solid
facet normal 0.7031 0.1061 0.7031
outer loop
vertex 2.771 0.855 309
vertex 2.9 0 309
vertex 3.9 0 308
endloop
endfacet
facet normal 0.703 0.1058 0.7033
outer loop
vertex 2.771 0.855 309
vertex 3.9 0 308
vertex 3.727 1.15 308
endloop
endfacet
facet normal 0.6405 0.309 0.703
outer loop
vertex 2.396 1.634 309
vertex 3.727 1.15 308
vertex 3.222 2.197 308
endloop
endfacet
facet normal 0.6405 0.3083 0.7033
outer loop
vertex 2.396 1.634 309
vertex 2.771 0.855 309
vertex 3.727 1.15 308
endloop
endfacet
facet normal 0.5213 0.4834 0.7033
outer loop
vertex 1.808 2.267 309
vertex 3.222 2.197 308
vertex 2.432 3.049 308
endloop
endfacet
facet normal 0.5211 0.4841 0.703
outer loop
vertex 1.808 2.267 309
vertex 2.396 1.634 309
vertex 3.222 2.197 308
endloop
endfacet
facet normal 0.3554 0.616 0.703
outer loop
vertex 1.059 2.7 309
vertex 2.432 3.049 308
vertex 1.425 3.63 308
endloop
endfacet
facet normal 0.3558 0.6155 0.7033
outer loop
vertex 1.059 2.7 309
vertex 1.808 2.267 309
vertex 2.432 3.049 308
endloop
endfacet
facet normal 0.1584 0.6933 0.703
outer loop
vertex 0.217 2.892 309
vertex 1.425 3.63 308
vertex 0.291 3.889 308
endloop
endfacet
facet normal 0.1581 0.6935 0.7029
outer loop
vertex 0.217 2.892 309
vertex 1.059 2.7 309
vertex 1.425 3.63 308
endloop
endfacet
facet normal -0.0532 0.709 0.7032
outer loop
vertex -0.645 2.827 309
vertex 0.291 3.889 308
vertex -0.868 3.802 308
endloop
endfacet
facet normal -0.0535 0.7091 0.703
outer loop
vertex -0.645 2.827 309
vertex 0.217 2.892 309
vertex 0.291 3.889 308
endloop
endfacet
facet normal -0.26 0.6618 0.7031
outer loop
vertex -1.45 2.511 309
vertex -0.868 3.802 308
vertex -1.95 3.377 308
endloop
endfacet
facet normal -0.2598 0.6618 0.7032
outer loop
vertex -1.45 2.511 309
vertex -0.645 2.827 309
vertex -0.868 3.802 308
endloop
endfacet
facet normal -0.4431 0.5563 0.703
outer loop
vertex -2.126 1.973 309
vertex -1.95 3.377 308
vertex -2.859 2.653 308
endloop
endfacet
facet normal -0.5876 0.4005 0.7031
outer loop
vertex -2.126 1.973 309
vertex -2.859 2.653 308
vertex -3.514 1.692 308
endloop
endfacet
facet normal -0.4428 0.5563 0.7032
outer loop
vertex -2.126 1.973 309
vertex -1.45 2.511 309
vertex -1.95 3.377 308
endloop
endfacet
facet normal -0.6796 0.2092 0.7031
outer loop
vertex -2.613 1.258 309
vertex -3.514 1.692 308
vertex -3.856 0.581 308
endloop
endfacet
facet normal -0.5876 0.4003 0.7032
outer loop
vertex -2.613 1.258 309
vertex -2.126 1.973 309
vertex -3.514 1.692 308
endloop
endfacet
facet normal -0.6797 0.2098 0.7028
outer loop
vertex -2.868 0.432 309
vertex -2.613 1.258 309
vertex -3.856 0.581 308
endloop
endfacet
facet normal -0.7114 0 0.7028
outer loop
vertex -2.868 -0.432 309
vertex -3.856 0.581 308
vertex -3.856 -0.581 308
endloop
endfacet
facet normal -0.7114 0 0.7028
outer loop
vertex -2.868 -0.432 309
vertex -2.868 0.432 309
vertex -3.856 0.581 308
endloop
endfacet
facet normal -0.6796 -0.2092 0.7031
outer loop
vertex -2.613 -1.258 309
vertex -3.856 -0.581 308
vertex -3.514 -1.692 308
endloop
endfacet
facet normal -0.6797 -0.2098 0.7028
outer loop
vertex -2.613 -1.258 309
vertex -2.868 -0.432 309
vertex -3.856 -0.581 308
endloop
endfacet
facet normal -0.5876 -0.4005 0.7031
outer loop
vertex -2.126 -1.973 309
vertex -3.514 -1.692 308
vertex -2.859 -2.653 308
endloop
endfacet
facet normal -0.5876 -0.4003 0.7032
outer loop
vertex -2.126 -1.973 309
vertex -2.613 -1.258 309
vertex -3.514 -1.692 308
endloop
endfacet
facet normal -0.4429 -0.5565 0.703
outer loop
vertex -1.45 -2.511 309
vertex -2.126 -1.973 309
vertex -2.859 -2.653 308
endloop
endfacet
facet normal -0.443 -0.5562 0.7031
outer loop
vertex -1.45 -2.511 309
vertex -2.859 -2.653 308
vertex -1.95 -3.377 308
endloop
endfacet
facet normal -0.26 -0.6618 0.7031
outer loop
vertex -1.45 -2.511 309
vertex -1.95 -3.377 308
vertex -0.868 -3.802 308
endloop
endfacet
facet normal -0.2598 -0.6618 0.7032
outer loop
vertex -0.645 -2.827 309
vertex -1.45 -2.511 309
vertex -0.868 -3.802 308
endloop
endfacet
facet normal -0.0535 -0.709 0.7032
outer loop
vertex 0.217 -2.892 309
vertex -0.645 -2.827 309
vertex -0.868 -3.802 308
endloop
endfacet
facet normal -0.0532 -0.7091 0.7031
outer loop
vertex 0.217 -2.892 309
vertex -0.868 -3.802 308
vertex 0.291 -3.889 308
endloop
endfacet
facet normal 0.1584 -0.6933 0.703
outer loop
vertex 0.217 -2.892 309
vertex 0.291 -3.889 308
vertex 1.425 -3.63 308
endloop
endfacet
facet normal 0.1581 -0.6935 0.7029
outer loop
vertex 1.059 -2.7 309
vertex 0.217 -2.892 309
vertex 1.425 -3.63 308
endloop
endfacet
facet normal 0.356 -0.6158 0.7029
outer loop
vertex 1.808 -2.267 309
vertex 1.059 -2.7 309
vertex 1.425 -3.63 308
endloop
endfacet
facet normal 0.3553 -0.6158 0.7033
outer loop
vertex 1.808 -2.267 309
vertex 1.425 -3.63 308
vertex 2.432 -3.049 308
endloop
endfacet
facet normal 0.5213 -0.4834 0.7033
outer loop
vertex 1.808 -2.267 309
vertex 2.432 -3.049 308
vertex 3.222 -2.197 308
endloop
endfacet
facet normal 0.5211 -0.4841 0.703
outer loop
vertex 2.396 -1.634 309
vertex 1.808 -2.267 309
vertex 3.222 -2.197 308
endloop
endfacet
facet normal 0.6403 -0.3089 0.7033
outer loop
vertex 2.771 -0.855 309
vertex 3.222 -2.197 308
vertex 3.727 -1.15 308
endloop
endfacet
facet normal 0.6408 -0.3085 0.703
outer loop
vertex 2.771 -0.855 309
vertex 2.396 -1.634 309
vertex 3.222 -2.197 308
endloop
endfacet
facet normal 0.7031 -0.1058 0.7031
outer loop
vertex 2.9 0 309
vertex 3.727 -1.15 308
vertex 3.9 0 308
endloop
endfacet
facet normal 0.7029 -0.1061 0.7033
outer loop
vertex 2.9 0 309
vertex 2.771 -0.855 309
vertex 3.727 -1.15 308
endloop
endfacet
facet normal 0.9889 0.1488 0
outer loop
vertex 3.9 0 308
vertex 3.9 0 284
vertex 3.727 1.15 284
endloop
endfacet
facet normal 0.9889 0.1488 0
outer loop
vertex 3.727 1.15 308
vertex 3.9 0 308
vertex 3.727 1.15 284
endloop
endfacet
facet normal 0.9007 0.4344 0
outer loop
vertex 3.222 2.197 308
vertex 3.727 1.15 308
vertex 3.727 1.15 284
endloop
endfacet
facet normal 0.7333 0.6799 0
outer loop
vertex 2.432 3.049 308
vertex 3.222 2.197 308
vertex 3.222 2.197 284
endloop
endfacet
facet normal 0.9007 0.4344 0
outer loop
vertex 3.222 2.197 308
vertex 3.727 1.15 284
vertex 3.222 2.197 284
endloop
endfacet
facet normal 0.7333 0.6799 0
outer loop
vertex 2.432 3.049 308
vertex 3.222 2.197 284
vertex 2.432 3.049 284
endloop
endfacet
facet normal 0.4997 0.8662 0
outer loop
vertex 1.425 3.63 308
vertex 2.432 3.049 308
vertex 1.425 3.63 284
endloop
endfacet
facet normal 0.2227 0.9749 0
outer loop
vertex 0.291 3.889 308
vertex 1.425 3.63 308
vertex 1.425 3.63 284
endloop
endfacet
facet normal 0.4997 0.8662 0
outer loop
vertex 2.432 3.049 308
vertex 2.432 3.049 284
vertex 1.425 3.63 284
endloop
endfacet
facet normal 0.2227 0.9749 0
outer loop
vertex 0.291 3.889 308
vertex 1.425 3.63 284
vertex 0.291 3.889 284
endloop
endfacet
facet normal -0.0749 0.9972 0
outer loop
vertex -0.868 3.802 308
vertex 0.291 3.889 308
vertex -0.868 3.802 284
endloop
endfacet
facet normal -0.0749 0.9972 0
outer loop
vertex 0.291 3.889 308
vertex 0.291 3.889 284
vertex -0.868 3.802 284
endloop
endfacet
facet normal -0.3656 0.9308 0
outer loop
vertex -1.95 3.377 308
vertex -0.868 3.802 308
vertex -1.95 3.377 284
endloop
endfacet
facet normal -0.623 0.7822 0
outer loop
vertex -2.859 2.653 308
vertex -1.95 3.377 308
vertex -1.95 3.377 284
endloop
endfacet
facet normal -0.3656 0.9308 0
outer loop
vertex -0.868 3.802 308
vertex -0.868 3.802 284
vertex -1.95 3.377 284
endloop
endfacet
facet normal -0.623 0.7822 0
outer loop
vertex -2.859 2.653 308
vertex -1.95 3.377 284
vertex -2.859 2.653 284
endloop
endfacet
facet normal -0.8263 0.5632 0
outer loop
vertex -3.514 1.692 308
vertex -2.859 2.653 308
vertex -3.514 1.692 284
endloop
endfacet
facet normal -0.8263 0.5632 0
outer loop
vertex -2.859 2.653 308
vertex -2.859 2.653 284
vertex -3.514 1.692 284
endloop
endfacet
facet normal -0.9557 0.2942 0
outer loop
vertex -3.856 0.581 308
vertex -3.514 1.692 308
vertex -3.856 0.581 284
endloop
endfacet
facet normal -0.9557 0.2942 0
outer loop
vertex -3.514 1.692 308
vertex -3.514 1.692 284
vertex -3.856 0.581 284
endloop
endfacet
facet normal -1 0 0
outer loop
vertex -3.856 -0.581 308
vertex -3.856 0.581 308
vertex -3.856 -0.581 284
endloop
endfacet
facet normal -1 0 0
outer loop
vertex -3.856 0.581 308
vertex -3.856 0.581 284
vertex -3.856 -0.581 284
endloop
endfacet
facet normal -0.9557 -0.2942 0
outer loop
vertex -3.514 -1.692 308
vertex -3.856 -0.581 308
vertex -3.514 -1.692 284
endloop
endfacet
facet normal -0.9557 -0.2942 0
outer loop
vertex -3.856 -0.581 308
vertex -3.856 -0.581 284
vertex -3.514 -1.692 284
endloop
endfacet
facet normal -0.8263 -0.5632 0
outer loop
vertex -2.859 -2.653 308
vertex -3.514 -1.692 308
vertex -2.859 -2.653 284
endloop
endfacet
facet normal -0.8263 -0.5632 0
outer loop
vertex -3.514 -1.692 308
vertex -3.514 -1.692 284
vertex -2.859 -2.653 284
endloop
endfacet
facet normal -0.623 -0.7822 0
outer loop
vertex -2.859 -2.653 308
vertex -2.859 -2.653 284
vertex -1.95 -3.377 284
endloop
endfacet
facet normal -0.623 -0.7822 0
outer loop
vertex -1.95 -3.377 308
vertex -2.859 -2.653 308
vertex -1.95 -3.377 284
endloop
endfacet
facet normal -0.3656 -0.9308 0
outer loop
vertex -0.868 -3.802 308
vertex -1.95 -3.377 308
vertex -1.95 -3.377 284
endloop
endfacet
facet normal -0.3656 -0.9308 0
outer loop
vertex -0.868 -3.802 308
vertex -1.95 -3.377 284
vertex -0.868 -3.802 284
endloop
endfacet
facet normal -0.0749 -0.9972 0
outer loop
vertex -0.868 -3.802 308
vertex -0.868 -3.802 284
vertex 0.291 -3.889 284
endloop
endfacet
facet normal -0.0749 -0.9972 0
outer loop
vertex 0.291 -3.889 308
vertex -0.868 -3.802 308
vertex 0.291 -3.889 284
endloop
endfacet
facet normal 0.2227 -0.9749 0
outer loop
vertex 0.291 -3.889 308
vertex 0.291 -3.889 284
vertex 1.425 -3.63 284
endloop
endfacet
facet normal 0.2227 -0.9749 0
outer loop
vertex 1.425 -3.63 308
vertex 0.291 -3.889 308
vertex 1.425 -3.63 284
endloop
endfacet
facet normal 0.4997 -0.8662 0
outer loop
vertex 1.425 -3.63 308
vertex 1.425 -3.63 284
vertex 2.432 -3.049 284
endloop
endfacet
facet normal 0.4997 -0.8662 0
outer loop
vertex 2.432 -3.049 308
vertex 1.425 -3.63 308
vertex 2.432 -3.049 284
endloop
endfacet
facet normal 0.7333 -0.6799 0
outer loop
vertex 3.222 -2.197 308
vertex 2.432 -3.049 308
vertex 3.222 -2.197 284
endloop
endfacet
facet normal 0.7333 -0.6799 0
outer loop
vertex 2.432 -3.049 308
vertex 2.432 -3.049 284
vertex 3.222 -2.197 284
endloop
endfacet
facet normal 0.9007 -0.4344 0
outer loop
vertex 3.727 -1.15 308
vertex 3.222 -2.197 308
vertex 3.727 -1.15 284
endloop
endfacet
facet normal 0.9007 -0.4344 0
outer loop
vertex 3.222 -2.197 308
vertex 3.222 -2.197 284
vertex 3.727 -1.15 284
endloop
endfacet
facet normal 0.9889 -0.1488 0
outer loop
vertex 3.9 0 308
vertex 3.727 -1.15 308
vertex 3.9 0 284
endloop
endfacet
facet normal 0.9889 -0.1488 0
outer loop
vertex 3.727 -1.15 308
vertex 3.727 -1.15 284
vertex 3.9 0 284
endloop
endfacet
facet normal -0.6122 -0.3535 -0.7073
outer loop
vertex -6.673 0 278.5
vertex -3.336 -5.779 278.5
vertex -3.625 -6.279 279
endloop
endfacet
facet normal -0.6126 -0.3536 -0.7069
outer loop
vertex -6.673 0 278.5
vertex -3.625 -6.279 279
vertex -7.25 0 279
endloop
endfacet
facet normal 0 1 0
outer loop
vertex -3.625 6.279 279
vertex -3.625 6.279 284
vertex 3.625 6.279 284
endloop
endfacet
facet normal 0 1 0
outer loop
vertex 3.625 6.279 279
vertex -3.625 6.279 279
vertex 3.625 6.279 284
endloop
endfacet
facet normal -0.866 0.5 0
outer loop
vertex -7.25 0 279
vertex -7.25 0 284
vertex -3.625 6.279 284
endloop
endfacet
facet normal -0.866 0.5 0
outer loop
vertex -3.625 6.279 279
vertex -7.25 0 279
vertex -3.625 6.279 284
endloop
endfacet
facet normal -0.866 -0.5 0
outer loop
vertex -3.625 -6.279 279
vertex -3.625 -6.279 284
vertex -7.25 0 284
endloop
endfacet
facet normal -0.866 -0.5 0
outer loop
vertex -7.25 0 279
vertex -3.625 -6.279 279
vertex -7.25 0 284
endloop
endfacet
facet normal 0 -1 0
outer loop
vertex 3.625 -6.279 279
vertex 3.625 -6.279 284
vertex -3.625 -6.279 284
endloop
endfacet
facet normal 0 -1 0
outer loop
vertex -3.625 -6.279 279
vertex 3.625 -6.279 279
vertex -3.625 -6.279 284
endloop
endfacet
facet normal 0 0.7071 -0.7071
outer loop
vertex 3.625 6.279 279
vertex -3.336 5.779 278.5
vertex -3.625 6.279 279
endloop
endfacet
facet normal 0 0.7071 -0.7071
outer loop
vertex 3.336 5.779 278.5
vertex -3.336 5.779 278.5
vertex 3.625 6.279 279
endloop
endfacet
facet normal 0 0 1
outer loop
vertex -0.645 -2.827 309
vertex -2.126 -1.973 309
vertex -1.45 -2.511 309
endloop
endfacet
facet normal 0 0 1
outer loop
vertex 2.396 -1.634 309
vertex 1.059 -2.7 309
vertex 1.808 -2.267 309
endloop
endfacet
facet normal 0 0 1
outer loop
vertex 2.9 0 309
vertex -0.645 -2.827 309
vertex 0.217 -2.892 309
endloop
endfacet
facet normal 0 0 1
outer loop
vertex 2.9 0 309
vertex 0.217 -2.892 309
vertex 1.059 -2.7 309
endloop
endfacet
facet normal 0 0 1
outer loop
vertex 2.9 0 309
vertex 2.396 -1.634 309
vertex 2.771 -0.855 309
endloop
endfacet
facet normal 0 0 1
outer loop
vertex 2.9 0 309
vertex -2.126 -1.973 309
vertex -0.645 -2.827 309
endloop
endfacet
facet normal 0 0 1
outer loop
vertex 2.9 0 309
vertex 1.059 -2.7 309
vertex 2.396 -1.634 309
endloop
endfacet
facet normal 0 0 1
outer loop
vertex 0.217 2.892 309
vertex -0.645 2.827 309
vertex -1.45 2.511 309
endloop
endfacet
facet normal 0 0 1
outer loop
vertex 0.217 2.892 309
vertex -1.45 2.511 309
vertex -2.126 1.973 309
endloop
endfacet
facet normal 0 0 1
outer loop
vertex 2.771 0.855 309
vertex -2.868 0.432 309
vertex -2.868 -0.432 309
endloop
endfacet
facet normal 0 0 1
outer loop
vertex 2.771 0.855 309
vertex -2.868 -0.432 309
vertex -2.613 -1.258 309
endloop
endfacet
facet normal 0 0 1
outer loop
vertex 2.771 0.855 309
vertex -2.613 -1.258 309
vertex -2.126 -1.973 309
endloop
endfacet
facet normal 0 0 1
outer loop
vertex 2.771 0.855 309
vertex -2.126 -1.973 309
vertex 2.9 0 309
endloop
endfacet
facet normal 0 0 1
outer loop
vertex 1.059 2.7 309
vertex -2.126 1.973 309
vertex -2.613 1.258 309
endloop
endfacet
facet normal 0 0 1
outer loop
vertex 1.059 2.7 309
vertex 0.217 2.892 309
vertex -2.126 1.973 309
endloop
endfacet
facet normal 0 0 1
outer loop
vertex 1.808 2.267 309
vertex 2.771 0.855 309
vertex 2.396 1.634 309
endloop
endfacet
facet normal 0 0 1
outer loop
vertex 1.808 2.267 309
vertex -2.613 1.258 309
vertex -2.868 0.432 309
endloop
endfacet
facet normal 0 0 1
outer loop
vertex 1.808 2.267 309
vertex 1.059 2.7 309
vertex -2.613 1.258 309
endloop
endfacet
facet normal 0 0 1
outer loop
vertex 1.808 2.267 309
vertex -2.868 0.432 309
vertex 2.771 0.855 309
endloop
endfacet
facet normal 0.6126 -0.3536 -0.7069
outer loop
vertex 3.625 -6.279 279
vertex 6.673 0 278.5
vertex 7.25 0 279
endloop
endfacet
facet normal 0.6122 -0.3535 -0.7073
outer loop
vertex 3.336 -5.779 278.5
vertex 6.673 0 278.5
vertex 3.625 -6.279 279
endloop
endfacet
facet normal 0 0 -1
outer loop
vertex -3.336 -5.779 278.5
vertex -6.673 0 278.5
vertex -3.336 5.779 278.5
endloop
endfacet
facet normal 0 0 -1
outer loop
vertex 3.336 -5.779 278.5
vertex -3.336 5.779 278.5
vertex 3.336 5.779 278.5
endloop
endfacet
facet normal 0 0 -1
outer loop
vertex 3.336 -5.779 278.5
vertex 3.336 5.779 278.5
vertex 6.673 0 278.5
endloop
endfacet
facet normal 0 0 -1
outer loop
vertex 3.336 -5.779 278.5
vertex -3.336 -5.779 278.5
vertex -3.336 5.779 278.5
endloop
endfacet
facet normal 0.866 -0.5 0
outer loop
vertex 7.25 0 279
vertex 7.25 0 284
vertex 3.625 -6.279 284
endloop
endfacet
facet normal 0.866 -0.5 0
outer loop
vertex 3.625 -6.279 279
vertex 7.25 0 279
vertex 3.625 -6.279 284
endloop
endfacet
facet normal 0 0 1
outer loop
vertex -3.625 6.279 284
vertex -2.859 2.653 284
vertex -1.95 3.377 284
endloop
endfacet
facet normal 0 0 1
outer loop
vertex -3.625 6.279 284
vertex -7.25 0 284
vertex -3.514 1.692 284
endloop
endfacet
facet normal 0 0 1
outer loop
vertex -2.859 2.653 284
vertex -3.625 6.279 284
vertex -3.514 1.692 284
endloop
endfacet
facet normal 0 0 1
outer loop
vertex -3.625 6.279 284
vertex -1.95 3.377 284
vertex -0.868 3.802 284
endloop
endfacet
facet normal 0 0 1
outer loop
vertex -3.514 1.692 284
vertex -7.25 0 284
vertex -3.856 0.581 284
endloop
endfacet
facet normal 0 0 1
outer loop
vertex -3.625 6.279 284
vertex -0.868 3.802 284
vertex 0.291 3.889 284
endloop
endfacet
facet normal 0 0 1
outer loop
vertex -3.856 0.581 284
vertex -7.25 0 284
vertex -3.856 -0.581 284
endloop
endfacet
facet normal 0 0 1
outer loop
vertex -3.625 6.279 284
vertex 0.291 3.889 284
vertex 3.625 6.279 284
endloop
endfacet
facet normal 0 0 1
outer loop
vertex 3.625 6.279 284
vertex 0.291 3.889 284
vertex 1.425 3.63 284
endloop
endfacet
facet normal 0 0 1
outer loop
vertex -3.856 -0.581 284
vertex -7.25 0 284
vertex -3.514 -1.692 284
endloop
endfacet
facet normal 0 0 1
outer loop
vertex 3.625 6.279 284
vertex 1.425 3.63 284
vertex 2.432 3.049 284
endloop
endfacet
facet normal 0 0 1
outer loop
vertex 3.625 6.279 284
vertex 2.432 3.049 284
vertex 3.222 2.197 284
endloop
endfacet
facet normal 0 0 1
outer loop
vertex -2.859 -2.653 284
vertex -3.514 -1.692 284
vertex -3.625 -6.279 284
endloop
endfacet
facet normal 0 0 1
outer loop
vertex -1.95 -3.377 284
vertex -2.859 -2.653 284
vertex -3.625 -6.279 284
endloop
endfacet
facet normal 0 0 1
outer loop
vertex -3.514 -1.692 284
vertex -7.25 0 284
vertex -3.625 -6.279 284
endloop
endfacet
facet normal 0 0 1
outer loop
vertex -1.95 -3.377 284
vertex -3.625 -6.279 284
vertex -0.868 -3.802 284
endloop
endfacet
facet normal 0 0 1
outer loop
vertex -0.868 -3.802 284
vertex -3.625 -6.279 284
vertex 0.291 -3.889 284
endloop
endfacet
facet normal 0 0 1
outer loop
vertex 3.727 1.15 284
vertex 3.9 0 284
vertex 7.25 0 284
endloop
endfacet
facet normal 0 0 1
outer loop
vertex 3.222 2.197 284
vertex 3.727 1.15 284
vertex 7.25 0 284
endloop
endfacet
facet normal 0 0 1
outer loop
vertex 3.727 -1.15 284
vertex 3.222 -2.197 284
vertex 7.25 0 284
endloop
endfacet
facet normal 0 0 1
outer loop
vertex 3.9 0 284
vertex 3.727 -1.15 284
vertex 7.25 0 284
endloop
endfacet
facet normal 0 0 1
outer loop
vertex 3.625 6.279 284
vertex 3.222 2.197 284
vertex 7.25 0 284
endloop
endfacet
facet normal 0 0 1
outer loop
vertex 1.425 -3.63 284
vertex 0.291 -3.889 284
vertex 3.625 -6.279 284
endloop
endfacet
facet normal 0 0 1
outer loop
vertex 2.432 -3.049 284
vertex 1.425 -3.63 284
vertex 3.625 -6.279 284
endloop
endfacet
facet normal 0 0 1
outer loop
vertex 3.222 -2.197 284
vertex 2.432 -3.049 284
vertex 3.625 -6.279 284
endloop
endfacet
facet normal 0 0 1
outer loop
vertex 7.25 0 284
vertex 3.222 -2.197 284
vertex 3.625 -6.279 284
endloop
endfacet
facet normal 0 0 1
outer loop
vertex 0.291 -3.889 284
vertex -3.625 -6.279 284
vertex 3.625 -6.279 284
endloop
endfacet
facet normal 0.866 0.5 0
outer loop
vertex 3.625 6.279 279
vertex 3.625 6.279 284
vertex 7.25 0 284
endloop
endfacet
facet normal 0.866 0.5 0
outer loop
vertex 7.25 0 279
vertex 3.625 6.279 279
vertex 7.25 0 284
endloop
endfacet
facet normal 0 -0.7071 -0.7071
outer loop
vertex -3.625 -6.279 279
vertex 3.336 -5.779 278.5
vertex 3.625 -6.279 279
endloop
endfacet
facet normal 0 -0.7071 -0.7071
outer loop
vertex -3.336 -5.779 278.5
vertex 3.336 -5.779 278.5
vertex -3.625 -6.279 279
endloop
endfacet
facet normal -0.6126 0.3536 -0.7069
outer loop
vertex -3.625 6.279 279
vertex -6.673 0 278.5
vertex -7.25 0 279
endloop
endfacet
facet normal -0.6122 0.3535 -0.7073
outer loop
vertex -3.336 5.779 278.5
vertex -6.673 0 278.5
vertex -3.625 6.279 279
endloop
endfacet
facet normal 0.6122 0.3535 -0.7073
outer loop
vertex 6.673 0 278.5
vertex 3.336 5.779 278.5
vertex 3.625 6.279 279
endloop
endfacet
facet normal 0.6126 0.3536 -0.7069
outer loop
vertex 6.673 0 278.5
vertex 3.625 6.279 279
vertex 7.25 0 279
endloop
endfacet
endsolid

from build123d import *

# Parameters (mm, degrees)
PAD029_DEPTH            = 5.5
SKETCH060_R             = 3.9
PAD030_DEPTH            = 25
CHAMFER011_SIZE         = 1
CHAMFER012_SIZE         = 0.5
BODY020_PLACEMENT_ANGLE = 180


with BuildPart() as part:
    # Sketch059 → Pad029 (new body)
    with BuildSketch(Plane.XY):
        Polygon((7.25, 0), (3.625, 6.278684), (-3.625, 6.278684), (-7.25, 0), (-3.625, -6.278684), (3.625, -6.278684), align=None)
    extrude(amount=PAD029_DEPTH)

    # Sketch060 (on Face7 of Pad029) → Pad030 (join)
    with BuildSketch(Plane(origin=(0, 0, 0), x_dir=(1, 0, 0), z_dir=(0, 0, -1))):
        Circle(SKETCH060_R)
    extrude(amount=PAD030_DEPTH)

    # Chamfer011
    chamfer011_edges = [part.edges().sort_by_distance(p)[0] for p in [
        (-3.9, 0, -25),
    ]]
    chamfer(chamfer011_edges, length=CHAMFER011_SIZE)

    # Chamfer012
    chamfer012_edges = [part.edges().sort_by_distance(p)[0] for p in [
        (5.4375, 3.139342, 5.5),
        (0, 6.278684, 5.5),
        (-5.4375, 3.139342, 5.5),
        (-5.4375, -3.139342, 5.5),
        (0, -6.278684, 5.5),
        (5.4375, -3.139342, 5.5),
    ]]
    chamfer(chamfer012_edges, length=CHAMFER012_SIZE)


with BuildPart() as part_1:
    # Body020 placement: moved
    add(part.part.moved(Location((0, 0, 284))).rotate(Axis((0, 0, 284), (1, 0, 0)), BODY020_PLACEMENT_ANGLE))


solid = part_1.part
